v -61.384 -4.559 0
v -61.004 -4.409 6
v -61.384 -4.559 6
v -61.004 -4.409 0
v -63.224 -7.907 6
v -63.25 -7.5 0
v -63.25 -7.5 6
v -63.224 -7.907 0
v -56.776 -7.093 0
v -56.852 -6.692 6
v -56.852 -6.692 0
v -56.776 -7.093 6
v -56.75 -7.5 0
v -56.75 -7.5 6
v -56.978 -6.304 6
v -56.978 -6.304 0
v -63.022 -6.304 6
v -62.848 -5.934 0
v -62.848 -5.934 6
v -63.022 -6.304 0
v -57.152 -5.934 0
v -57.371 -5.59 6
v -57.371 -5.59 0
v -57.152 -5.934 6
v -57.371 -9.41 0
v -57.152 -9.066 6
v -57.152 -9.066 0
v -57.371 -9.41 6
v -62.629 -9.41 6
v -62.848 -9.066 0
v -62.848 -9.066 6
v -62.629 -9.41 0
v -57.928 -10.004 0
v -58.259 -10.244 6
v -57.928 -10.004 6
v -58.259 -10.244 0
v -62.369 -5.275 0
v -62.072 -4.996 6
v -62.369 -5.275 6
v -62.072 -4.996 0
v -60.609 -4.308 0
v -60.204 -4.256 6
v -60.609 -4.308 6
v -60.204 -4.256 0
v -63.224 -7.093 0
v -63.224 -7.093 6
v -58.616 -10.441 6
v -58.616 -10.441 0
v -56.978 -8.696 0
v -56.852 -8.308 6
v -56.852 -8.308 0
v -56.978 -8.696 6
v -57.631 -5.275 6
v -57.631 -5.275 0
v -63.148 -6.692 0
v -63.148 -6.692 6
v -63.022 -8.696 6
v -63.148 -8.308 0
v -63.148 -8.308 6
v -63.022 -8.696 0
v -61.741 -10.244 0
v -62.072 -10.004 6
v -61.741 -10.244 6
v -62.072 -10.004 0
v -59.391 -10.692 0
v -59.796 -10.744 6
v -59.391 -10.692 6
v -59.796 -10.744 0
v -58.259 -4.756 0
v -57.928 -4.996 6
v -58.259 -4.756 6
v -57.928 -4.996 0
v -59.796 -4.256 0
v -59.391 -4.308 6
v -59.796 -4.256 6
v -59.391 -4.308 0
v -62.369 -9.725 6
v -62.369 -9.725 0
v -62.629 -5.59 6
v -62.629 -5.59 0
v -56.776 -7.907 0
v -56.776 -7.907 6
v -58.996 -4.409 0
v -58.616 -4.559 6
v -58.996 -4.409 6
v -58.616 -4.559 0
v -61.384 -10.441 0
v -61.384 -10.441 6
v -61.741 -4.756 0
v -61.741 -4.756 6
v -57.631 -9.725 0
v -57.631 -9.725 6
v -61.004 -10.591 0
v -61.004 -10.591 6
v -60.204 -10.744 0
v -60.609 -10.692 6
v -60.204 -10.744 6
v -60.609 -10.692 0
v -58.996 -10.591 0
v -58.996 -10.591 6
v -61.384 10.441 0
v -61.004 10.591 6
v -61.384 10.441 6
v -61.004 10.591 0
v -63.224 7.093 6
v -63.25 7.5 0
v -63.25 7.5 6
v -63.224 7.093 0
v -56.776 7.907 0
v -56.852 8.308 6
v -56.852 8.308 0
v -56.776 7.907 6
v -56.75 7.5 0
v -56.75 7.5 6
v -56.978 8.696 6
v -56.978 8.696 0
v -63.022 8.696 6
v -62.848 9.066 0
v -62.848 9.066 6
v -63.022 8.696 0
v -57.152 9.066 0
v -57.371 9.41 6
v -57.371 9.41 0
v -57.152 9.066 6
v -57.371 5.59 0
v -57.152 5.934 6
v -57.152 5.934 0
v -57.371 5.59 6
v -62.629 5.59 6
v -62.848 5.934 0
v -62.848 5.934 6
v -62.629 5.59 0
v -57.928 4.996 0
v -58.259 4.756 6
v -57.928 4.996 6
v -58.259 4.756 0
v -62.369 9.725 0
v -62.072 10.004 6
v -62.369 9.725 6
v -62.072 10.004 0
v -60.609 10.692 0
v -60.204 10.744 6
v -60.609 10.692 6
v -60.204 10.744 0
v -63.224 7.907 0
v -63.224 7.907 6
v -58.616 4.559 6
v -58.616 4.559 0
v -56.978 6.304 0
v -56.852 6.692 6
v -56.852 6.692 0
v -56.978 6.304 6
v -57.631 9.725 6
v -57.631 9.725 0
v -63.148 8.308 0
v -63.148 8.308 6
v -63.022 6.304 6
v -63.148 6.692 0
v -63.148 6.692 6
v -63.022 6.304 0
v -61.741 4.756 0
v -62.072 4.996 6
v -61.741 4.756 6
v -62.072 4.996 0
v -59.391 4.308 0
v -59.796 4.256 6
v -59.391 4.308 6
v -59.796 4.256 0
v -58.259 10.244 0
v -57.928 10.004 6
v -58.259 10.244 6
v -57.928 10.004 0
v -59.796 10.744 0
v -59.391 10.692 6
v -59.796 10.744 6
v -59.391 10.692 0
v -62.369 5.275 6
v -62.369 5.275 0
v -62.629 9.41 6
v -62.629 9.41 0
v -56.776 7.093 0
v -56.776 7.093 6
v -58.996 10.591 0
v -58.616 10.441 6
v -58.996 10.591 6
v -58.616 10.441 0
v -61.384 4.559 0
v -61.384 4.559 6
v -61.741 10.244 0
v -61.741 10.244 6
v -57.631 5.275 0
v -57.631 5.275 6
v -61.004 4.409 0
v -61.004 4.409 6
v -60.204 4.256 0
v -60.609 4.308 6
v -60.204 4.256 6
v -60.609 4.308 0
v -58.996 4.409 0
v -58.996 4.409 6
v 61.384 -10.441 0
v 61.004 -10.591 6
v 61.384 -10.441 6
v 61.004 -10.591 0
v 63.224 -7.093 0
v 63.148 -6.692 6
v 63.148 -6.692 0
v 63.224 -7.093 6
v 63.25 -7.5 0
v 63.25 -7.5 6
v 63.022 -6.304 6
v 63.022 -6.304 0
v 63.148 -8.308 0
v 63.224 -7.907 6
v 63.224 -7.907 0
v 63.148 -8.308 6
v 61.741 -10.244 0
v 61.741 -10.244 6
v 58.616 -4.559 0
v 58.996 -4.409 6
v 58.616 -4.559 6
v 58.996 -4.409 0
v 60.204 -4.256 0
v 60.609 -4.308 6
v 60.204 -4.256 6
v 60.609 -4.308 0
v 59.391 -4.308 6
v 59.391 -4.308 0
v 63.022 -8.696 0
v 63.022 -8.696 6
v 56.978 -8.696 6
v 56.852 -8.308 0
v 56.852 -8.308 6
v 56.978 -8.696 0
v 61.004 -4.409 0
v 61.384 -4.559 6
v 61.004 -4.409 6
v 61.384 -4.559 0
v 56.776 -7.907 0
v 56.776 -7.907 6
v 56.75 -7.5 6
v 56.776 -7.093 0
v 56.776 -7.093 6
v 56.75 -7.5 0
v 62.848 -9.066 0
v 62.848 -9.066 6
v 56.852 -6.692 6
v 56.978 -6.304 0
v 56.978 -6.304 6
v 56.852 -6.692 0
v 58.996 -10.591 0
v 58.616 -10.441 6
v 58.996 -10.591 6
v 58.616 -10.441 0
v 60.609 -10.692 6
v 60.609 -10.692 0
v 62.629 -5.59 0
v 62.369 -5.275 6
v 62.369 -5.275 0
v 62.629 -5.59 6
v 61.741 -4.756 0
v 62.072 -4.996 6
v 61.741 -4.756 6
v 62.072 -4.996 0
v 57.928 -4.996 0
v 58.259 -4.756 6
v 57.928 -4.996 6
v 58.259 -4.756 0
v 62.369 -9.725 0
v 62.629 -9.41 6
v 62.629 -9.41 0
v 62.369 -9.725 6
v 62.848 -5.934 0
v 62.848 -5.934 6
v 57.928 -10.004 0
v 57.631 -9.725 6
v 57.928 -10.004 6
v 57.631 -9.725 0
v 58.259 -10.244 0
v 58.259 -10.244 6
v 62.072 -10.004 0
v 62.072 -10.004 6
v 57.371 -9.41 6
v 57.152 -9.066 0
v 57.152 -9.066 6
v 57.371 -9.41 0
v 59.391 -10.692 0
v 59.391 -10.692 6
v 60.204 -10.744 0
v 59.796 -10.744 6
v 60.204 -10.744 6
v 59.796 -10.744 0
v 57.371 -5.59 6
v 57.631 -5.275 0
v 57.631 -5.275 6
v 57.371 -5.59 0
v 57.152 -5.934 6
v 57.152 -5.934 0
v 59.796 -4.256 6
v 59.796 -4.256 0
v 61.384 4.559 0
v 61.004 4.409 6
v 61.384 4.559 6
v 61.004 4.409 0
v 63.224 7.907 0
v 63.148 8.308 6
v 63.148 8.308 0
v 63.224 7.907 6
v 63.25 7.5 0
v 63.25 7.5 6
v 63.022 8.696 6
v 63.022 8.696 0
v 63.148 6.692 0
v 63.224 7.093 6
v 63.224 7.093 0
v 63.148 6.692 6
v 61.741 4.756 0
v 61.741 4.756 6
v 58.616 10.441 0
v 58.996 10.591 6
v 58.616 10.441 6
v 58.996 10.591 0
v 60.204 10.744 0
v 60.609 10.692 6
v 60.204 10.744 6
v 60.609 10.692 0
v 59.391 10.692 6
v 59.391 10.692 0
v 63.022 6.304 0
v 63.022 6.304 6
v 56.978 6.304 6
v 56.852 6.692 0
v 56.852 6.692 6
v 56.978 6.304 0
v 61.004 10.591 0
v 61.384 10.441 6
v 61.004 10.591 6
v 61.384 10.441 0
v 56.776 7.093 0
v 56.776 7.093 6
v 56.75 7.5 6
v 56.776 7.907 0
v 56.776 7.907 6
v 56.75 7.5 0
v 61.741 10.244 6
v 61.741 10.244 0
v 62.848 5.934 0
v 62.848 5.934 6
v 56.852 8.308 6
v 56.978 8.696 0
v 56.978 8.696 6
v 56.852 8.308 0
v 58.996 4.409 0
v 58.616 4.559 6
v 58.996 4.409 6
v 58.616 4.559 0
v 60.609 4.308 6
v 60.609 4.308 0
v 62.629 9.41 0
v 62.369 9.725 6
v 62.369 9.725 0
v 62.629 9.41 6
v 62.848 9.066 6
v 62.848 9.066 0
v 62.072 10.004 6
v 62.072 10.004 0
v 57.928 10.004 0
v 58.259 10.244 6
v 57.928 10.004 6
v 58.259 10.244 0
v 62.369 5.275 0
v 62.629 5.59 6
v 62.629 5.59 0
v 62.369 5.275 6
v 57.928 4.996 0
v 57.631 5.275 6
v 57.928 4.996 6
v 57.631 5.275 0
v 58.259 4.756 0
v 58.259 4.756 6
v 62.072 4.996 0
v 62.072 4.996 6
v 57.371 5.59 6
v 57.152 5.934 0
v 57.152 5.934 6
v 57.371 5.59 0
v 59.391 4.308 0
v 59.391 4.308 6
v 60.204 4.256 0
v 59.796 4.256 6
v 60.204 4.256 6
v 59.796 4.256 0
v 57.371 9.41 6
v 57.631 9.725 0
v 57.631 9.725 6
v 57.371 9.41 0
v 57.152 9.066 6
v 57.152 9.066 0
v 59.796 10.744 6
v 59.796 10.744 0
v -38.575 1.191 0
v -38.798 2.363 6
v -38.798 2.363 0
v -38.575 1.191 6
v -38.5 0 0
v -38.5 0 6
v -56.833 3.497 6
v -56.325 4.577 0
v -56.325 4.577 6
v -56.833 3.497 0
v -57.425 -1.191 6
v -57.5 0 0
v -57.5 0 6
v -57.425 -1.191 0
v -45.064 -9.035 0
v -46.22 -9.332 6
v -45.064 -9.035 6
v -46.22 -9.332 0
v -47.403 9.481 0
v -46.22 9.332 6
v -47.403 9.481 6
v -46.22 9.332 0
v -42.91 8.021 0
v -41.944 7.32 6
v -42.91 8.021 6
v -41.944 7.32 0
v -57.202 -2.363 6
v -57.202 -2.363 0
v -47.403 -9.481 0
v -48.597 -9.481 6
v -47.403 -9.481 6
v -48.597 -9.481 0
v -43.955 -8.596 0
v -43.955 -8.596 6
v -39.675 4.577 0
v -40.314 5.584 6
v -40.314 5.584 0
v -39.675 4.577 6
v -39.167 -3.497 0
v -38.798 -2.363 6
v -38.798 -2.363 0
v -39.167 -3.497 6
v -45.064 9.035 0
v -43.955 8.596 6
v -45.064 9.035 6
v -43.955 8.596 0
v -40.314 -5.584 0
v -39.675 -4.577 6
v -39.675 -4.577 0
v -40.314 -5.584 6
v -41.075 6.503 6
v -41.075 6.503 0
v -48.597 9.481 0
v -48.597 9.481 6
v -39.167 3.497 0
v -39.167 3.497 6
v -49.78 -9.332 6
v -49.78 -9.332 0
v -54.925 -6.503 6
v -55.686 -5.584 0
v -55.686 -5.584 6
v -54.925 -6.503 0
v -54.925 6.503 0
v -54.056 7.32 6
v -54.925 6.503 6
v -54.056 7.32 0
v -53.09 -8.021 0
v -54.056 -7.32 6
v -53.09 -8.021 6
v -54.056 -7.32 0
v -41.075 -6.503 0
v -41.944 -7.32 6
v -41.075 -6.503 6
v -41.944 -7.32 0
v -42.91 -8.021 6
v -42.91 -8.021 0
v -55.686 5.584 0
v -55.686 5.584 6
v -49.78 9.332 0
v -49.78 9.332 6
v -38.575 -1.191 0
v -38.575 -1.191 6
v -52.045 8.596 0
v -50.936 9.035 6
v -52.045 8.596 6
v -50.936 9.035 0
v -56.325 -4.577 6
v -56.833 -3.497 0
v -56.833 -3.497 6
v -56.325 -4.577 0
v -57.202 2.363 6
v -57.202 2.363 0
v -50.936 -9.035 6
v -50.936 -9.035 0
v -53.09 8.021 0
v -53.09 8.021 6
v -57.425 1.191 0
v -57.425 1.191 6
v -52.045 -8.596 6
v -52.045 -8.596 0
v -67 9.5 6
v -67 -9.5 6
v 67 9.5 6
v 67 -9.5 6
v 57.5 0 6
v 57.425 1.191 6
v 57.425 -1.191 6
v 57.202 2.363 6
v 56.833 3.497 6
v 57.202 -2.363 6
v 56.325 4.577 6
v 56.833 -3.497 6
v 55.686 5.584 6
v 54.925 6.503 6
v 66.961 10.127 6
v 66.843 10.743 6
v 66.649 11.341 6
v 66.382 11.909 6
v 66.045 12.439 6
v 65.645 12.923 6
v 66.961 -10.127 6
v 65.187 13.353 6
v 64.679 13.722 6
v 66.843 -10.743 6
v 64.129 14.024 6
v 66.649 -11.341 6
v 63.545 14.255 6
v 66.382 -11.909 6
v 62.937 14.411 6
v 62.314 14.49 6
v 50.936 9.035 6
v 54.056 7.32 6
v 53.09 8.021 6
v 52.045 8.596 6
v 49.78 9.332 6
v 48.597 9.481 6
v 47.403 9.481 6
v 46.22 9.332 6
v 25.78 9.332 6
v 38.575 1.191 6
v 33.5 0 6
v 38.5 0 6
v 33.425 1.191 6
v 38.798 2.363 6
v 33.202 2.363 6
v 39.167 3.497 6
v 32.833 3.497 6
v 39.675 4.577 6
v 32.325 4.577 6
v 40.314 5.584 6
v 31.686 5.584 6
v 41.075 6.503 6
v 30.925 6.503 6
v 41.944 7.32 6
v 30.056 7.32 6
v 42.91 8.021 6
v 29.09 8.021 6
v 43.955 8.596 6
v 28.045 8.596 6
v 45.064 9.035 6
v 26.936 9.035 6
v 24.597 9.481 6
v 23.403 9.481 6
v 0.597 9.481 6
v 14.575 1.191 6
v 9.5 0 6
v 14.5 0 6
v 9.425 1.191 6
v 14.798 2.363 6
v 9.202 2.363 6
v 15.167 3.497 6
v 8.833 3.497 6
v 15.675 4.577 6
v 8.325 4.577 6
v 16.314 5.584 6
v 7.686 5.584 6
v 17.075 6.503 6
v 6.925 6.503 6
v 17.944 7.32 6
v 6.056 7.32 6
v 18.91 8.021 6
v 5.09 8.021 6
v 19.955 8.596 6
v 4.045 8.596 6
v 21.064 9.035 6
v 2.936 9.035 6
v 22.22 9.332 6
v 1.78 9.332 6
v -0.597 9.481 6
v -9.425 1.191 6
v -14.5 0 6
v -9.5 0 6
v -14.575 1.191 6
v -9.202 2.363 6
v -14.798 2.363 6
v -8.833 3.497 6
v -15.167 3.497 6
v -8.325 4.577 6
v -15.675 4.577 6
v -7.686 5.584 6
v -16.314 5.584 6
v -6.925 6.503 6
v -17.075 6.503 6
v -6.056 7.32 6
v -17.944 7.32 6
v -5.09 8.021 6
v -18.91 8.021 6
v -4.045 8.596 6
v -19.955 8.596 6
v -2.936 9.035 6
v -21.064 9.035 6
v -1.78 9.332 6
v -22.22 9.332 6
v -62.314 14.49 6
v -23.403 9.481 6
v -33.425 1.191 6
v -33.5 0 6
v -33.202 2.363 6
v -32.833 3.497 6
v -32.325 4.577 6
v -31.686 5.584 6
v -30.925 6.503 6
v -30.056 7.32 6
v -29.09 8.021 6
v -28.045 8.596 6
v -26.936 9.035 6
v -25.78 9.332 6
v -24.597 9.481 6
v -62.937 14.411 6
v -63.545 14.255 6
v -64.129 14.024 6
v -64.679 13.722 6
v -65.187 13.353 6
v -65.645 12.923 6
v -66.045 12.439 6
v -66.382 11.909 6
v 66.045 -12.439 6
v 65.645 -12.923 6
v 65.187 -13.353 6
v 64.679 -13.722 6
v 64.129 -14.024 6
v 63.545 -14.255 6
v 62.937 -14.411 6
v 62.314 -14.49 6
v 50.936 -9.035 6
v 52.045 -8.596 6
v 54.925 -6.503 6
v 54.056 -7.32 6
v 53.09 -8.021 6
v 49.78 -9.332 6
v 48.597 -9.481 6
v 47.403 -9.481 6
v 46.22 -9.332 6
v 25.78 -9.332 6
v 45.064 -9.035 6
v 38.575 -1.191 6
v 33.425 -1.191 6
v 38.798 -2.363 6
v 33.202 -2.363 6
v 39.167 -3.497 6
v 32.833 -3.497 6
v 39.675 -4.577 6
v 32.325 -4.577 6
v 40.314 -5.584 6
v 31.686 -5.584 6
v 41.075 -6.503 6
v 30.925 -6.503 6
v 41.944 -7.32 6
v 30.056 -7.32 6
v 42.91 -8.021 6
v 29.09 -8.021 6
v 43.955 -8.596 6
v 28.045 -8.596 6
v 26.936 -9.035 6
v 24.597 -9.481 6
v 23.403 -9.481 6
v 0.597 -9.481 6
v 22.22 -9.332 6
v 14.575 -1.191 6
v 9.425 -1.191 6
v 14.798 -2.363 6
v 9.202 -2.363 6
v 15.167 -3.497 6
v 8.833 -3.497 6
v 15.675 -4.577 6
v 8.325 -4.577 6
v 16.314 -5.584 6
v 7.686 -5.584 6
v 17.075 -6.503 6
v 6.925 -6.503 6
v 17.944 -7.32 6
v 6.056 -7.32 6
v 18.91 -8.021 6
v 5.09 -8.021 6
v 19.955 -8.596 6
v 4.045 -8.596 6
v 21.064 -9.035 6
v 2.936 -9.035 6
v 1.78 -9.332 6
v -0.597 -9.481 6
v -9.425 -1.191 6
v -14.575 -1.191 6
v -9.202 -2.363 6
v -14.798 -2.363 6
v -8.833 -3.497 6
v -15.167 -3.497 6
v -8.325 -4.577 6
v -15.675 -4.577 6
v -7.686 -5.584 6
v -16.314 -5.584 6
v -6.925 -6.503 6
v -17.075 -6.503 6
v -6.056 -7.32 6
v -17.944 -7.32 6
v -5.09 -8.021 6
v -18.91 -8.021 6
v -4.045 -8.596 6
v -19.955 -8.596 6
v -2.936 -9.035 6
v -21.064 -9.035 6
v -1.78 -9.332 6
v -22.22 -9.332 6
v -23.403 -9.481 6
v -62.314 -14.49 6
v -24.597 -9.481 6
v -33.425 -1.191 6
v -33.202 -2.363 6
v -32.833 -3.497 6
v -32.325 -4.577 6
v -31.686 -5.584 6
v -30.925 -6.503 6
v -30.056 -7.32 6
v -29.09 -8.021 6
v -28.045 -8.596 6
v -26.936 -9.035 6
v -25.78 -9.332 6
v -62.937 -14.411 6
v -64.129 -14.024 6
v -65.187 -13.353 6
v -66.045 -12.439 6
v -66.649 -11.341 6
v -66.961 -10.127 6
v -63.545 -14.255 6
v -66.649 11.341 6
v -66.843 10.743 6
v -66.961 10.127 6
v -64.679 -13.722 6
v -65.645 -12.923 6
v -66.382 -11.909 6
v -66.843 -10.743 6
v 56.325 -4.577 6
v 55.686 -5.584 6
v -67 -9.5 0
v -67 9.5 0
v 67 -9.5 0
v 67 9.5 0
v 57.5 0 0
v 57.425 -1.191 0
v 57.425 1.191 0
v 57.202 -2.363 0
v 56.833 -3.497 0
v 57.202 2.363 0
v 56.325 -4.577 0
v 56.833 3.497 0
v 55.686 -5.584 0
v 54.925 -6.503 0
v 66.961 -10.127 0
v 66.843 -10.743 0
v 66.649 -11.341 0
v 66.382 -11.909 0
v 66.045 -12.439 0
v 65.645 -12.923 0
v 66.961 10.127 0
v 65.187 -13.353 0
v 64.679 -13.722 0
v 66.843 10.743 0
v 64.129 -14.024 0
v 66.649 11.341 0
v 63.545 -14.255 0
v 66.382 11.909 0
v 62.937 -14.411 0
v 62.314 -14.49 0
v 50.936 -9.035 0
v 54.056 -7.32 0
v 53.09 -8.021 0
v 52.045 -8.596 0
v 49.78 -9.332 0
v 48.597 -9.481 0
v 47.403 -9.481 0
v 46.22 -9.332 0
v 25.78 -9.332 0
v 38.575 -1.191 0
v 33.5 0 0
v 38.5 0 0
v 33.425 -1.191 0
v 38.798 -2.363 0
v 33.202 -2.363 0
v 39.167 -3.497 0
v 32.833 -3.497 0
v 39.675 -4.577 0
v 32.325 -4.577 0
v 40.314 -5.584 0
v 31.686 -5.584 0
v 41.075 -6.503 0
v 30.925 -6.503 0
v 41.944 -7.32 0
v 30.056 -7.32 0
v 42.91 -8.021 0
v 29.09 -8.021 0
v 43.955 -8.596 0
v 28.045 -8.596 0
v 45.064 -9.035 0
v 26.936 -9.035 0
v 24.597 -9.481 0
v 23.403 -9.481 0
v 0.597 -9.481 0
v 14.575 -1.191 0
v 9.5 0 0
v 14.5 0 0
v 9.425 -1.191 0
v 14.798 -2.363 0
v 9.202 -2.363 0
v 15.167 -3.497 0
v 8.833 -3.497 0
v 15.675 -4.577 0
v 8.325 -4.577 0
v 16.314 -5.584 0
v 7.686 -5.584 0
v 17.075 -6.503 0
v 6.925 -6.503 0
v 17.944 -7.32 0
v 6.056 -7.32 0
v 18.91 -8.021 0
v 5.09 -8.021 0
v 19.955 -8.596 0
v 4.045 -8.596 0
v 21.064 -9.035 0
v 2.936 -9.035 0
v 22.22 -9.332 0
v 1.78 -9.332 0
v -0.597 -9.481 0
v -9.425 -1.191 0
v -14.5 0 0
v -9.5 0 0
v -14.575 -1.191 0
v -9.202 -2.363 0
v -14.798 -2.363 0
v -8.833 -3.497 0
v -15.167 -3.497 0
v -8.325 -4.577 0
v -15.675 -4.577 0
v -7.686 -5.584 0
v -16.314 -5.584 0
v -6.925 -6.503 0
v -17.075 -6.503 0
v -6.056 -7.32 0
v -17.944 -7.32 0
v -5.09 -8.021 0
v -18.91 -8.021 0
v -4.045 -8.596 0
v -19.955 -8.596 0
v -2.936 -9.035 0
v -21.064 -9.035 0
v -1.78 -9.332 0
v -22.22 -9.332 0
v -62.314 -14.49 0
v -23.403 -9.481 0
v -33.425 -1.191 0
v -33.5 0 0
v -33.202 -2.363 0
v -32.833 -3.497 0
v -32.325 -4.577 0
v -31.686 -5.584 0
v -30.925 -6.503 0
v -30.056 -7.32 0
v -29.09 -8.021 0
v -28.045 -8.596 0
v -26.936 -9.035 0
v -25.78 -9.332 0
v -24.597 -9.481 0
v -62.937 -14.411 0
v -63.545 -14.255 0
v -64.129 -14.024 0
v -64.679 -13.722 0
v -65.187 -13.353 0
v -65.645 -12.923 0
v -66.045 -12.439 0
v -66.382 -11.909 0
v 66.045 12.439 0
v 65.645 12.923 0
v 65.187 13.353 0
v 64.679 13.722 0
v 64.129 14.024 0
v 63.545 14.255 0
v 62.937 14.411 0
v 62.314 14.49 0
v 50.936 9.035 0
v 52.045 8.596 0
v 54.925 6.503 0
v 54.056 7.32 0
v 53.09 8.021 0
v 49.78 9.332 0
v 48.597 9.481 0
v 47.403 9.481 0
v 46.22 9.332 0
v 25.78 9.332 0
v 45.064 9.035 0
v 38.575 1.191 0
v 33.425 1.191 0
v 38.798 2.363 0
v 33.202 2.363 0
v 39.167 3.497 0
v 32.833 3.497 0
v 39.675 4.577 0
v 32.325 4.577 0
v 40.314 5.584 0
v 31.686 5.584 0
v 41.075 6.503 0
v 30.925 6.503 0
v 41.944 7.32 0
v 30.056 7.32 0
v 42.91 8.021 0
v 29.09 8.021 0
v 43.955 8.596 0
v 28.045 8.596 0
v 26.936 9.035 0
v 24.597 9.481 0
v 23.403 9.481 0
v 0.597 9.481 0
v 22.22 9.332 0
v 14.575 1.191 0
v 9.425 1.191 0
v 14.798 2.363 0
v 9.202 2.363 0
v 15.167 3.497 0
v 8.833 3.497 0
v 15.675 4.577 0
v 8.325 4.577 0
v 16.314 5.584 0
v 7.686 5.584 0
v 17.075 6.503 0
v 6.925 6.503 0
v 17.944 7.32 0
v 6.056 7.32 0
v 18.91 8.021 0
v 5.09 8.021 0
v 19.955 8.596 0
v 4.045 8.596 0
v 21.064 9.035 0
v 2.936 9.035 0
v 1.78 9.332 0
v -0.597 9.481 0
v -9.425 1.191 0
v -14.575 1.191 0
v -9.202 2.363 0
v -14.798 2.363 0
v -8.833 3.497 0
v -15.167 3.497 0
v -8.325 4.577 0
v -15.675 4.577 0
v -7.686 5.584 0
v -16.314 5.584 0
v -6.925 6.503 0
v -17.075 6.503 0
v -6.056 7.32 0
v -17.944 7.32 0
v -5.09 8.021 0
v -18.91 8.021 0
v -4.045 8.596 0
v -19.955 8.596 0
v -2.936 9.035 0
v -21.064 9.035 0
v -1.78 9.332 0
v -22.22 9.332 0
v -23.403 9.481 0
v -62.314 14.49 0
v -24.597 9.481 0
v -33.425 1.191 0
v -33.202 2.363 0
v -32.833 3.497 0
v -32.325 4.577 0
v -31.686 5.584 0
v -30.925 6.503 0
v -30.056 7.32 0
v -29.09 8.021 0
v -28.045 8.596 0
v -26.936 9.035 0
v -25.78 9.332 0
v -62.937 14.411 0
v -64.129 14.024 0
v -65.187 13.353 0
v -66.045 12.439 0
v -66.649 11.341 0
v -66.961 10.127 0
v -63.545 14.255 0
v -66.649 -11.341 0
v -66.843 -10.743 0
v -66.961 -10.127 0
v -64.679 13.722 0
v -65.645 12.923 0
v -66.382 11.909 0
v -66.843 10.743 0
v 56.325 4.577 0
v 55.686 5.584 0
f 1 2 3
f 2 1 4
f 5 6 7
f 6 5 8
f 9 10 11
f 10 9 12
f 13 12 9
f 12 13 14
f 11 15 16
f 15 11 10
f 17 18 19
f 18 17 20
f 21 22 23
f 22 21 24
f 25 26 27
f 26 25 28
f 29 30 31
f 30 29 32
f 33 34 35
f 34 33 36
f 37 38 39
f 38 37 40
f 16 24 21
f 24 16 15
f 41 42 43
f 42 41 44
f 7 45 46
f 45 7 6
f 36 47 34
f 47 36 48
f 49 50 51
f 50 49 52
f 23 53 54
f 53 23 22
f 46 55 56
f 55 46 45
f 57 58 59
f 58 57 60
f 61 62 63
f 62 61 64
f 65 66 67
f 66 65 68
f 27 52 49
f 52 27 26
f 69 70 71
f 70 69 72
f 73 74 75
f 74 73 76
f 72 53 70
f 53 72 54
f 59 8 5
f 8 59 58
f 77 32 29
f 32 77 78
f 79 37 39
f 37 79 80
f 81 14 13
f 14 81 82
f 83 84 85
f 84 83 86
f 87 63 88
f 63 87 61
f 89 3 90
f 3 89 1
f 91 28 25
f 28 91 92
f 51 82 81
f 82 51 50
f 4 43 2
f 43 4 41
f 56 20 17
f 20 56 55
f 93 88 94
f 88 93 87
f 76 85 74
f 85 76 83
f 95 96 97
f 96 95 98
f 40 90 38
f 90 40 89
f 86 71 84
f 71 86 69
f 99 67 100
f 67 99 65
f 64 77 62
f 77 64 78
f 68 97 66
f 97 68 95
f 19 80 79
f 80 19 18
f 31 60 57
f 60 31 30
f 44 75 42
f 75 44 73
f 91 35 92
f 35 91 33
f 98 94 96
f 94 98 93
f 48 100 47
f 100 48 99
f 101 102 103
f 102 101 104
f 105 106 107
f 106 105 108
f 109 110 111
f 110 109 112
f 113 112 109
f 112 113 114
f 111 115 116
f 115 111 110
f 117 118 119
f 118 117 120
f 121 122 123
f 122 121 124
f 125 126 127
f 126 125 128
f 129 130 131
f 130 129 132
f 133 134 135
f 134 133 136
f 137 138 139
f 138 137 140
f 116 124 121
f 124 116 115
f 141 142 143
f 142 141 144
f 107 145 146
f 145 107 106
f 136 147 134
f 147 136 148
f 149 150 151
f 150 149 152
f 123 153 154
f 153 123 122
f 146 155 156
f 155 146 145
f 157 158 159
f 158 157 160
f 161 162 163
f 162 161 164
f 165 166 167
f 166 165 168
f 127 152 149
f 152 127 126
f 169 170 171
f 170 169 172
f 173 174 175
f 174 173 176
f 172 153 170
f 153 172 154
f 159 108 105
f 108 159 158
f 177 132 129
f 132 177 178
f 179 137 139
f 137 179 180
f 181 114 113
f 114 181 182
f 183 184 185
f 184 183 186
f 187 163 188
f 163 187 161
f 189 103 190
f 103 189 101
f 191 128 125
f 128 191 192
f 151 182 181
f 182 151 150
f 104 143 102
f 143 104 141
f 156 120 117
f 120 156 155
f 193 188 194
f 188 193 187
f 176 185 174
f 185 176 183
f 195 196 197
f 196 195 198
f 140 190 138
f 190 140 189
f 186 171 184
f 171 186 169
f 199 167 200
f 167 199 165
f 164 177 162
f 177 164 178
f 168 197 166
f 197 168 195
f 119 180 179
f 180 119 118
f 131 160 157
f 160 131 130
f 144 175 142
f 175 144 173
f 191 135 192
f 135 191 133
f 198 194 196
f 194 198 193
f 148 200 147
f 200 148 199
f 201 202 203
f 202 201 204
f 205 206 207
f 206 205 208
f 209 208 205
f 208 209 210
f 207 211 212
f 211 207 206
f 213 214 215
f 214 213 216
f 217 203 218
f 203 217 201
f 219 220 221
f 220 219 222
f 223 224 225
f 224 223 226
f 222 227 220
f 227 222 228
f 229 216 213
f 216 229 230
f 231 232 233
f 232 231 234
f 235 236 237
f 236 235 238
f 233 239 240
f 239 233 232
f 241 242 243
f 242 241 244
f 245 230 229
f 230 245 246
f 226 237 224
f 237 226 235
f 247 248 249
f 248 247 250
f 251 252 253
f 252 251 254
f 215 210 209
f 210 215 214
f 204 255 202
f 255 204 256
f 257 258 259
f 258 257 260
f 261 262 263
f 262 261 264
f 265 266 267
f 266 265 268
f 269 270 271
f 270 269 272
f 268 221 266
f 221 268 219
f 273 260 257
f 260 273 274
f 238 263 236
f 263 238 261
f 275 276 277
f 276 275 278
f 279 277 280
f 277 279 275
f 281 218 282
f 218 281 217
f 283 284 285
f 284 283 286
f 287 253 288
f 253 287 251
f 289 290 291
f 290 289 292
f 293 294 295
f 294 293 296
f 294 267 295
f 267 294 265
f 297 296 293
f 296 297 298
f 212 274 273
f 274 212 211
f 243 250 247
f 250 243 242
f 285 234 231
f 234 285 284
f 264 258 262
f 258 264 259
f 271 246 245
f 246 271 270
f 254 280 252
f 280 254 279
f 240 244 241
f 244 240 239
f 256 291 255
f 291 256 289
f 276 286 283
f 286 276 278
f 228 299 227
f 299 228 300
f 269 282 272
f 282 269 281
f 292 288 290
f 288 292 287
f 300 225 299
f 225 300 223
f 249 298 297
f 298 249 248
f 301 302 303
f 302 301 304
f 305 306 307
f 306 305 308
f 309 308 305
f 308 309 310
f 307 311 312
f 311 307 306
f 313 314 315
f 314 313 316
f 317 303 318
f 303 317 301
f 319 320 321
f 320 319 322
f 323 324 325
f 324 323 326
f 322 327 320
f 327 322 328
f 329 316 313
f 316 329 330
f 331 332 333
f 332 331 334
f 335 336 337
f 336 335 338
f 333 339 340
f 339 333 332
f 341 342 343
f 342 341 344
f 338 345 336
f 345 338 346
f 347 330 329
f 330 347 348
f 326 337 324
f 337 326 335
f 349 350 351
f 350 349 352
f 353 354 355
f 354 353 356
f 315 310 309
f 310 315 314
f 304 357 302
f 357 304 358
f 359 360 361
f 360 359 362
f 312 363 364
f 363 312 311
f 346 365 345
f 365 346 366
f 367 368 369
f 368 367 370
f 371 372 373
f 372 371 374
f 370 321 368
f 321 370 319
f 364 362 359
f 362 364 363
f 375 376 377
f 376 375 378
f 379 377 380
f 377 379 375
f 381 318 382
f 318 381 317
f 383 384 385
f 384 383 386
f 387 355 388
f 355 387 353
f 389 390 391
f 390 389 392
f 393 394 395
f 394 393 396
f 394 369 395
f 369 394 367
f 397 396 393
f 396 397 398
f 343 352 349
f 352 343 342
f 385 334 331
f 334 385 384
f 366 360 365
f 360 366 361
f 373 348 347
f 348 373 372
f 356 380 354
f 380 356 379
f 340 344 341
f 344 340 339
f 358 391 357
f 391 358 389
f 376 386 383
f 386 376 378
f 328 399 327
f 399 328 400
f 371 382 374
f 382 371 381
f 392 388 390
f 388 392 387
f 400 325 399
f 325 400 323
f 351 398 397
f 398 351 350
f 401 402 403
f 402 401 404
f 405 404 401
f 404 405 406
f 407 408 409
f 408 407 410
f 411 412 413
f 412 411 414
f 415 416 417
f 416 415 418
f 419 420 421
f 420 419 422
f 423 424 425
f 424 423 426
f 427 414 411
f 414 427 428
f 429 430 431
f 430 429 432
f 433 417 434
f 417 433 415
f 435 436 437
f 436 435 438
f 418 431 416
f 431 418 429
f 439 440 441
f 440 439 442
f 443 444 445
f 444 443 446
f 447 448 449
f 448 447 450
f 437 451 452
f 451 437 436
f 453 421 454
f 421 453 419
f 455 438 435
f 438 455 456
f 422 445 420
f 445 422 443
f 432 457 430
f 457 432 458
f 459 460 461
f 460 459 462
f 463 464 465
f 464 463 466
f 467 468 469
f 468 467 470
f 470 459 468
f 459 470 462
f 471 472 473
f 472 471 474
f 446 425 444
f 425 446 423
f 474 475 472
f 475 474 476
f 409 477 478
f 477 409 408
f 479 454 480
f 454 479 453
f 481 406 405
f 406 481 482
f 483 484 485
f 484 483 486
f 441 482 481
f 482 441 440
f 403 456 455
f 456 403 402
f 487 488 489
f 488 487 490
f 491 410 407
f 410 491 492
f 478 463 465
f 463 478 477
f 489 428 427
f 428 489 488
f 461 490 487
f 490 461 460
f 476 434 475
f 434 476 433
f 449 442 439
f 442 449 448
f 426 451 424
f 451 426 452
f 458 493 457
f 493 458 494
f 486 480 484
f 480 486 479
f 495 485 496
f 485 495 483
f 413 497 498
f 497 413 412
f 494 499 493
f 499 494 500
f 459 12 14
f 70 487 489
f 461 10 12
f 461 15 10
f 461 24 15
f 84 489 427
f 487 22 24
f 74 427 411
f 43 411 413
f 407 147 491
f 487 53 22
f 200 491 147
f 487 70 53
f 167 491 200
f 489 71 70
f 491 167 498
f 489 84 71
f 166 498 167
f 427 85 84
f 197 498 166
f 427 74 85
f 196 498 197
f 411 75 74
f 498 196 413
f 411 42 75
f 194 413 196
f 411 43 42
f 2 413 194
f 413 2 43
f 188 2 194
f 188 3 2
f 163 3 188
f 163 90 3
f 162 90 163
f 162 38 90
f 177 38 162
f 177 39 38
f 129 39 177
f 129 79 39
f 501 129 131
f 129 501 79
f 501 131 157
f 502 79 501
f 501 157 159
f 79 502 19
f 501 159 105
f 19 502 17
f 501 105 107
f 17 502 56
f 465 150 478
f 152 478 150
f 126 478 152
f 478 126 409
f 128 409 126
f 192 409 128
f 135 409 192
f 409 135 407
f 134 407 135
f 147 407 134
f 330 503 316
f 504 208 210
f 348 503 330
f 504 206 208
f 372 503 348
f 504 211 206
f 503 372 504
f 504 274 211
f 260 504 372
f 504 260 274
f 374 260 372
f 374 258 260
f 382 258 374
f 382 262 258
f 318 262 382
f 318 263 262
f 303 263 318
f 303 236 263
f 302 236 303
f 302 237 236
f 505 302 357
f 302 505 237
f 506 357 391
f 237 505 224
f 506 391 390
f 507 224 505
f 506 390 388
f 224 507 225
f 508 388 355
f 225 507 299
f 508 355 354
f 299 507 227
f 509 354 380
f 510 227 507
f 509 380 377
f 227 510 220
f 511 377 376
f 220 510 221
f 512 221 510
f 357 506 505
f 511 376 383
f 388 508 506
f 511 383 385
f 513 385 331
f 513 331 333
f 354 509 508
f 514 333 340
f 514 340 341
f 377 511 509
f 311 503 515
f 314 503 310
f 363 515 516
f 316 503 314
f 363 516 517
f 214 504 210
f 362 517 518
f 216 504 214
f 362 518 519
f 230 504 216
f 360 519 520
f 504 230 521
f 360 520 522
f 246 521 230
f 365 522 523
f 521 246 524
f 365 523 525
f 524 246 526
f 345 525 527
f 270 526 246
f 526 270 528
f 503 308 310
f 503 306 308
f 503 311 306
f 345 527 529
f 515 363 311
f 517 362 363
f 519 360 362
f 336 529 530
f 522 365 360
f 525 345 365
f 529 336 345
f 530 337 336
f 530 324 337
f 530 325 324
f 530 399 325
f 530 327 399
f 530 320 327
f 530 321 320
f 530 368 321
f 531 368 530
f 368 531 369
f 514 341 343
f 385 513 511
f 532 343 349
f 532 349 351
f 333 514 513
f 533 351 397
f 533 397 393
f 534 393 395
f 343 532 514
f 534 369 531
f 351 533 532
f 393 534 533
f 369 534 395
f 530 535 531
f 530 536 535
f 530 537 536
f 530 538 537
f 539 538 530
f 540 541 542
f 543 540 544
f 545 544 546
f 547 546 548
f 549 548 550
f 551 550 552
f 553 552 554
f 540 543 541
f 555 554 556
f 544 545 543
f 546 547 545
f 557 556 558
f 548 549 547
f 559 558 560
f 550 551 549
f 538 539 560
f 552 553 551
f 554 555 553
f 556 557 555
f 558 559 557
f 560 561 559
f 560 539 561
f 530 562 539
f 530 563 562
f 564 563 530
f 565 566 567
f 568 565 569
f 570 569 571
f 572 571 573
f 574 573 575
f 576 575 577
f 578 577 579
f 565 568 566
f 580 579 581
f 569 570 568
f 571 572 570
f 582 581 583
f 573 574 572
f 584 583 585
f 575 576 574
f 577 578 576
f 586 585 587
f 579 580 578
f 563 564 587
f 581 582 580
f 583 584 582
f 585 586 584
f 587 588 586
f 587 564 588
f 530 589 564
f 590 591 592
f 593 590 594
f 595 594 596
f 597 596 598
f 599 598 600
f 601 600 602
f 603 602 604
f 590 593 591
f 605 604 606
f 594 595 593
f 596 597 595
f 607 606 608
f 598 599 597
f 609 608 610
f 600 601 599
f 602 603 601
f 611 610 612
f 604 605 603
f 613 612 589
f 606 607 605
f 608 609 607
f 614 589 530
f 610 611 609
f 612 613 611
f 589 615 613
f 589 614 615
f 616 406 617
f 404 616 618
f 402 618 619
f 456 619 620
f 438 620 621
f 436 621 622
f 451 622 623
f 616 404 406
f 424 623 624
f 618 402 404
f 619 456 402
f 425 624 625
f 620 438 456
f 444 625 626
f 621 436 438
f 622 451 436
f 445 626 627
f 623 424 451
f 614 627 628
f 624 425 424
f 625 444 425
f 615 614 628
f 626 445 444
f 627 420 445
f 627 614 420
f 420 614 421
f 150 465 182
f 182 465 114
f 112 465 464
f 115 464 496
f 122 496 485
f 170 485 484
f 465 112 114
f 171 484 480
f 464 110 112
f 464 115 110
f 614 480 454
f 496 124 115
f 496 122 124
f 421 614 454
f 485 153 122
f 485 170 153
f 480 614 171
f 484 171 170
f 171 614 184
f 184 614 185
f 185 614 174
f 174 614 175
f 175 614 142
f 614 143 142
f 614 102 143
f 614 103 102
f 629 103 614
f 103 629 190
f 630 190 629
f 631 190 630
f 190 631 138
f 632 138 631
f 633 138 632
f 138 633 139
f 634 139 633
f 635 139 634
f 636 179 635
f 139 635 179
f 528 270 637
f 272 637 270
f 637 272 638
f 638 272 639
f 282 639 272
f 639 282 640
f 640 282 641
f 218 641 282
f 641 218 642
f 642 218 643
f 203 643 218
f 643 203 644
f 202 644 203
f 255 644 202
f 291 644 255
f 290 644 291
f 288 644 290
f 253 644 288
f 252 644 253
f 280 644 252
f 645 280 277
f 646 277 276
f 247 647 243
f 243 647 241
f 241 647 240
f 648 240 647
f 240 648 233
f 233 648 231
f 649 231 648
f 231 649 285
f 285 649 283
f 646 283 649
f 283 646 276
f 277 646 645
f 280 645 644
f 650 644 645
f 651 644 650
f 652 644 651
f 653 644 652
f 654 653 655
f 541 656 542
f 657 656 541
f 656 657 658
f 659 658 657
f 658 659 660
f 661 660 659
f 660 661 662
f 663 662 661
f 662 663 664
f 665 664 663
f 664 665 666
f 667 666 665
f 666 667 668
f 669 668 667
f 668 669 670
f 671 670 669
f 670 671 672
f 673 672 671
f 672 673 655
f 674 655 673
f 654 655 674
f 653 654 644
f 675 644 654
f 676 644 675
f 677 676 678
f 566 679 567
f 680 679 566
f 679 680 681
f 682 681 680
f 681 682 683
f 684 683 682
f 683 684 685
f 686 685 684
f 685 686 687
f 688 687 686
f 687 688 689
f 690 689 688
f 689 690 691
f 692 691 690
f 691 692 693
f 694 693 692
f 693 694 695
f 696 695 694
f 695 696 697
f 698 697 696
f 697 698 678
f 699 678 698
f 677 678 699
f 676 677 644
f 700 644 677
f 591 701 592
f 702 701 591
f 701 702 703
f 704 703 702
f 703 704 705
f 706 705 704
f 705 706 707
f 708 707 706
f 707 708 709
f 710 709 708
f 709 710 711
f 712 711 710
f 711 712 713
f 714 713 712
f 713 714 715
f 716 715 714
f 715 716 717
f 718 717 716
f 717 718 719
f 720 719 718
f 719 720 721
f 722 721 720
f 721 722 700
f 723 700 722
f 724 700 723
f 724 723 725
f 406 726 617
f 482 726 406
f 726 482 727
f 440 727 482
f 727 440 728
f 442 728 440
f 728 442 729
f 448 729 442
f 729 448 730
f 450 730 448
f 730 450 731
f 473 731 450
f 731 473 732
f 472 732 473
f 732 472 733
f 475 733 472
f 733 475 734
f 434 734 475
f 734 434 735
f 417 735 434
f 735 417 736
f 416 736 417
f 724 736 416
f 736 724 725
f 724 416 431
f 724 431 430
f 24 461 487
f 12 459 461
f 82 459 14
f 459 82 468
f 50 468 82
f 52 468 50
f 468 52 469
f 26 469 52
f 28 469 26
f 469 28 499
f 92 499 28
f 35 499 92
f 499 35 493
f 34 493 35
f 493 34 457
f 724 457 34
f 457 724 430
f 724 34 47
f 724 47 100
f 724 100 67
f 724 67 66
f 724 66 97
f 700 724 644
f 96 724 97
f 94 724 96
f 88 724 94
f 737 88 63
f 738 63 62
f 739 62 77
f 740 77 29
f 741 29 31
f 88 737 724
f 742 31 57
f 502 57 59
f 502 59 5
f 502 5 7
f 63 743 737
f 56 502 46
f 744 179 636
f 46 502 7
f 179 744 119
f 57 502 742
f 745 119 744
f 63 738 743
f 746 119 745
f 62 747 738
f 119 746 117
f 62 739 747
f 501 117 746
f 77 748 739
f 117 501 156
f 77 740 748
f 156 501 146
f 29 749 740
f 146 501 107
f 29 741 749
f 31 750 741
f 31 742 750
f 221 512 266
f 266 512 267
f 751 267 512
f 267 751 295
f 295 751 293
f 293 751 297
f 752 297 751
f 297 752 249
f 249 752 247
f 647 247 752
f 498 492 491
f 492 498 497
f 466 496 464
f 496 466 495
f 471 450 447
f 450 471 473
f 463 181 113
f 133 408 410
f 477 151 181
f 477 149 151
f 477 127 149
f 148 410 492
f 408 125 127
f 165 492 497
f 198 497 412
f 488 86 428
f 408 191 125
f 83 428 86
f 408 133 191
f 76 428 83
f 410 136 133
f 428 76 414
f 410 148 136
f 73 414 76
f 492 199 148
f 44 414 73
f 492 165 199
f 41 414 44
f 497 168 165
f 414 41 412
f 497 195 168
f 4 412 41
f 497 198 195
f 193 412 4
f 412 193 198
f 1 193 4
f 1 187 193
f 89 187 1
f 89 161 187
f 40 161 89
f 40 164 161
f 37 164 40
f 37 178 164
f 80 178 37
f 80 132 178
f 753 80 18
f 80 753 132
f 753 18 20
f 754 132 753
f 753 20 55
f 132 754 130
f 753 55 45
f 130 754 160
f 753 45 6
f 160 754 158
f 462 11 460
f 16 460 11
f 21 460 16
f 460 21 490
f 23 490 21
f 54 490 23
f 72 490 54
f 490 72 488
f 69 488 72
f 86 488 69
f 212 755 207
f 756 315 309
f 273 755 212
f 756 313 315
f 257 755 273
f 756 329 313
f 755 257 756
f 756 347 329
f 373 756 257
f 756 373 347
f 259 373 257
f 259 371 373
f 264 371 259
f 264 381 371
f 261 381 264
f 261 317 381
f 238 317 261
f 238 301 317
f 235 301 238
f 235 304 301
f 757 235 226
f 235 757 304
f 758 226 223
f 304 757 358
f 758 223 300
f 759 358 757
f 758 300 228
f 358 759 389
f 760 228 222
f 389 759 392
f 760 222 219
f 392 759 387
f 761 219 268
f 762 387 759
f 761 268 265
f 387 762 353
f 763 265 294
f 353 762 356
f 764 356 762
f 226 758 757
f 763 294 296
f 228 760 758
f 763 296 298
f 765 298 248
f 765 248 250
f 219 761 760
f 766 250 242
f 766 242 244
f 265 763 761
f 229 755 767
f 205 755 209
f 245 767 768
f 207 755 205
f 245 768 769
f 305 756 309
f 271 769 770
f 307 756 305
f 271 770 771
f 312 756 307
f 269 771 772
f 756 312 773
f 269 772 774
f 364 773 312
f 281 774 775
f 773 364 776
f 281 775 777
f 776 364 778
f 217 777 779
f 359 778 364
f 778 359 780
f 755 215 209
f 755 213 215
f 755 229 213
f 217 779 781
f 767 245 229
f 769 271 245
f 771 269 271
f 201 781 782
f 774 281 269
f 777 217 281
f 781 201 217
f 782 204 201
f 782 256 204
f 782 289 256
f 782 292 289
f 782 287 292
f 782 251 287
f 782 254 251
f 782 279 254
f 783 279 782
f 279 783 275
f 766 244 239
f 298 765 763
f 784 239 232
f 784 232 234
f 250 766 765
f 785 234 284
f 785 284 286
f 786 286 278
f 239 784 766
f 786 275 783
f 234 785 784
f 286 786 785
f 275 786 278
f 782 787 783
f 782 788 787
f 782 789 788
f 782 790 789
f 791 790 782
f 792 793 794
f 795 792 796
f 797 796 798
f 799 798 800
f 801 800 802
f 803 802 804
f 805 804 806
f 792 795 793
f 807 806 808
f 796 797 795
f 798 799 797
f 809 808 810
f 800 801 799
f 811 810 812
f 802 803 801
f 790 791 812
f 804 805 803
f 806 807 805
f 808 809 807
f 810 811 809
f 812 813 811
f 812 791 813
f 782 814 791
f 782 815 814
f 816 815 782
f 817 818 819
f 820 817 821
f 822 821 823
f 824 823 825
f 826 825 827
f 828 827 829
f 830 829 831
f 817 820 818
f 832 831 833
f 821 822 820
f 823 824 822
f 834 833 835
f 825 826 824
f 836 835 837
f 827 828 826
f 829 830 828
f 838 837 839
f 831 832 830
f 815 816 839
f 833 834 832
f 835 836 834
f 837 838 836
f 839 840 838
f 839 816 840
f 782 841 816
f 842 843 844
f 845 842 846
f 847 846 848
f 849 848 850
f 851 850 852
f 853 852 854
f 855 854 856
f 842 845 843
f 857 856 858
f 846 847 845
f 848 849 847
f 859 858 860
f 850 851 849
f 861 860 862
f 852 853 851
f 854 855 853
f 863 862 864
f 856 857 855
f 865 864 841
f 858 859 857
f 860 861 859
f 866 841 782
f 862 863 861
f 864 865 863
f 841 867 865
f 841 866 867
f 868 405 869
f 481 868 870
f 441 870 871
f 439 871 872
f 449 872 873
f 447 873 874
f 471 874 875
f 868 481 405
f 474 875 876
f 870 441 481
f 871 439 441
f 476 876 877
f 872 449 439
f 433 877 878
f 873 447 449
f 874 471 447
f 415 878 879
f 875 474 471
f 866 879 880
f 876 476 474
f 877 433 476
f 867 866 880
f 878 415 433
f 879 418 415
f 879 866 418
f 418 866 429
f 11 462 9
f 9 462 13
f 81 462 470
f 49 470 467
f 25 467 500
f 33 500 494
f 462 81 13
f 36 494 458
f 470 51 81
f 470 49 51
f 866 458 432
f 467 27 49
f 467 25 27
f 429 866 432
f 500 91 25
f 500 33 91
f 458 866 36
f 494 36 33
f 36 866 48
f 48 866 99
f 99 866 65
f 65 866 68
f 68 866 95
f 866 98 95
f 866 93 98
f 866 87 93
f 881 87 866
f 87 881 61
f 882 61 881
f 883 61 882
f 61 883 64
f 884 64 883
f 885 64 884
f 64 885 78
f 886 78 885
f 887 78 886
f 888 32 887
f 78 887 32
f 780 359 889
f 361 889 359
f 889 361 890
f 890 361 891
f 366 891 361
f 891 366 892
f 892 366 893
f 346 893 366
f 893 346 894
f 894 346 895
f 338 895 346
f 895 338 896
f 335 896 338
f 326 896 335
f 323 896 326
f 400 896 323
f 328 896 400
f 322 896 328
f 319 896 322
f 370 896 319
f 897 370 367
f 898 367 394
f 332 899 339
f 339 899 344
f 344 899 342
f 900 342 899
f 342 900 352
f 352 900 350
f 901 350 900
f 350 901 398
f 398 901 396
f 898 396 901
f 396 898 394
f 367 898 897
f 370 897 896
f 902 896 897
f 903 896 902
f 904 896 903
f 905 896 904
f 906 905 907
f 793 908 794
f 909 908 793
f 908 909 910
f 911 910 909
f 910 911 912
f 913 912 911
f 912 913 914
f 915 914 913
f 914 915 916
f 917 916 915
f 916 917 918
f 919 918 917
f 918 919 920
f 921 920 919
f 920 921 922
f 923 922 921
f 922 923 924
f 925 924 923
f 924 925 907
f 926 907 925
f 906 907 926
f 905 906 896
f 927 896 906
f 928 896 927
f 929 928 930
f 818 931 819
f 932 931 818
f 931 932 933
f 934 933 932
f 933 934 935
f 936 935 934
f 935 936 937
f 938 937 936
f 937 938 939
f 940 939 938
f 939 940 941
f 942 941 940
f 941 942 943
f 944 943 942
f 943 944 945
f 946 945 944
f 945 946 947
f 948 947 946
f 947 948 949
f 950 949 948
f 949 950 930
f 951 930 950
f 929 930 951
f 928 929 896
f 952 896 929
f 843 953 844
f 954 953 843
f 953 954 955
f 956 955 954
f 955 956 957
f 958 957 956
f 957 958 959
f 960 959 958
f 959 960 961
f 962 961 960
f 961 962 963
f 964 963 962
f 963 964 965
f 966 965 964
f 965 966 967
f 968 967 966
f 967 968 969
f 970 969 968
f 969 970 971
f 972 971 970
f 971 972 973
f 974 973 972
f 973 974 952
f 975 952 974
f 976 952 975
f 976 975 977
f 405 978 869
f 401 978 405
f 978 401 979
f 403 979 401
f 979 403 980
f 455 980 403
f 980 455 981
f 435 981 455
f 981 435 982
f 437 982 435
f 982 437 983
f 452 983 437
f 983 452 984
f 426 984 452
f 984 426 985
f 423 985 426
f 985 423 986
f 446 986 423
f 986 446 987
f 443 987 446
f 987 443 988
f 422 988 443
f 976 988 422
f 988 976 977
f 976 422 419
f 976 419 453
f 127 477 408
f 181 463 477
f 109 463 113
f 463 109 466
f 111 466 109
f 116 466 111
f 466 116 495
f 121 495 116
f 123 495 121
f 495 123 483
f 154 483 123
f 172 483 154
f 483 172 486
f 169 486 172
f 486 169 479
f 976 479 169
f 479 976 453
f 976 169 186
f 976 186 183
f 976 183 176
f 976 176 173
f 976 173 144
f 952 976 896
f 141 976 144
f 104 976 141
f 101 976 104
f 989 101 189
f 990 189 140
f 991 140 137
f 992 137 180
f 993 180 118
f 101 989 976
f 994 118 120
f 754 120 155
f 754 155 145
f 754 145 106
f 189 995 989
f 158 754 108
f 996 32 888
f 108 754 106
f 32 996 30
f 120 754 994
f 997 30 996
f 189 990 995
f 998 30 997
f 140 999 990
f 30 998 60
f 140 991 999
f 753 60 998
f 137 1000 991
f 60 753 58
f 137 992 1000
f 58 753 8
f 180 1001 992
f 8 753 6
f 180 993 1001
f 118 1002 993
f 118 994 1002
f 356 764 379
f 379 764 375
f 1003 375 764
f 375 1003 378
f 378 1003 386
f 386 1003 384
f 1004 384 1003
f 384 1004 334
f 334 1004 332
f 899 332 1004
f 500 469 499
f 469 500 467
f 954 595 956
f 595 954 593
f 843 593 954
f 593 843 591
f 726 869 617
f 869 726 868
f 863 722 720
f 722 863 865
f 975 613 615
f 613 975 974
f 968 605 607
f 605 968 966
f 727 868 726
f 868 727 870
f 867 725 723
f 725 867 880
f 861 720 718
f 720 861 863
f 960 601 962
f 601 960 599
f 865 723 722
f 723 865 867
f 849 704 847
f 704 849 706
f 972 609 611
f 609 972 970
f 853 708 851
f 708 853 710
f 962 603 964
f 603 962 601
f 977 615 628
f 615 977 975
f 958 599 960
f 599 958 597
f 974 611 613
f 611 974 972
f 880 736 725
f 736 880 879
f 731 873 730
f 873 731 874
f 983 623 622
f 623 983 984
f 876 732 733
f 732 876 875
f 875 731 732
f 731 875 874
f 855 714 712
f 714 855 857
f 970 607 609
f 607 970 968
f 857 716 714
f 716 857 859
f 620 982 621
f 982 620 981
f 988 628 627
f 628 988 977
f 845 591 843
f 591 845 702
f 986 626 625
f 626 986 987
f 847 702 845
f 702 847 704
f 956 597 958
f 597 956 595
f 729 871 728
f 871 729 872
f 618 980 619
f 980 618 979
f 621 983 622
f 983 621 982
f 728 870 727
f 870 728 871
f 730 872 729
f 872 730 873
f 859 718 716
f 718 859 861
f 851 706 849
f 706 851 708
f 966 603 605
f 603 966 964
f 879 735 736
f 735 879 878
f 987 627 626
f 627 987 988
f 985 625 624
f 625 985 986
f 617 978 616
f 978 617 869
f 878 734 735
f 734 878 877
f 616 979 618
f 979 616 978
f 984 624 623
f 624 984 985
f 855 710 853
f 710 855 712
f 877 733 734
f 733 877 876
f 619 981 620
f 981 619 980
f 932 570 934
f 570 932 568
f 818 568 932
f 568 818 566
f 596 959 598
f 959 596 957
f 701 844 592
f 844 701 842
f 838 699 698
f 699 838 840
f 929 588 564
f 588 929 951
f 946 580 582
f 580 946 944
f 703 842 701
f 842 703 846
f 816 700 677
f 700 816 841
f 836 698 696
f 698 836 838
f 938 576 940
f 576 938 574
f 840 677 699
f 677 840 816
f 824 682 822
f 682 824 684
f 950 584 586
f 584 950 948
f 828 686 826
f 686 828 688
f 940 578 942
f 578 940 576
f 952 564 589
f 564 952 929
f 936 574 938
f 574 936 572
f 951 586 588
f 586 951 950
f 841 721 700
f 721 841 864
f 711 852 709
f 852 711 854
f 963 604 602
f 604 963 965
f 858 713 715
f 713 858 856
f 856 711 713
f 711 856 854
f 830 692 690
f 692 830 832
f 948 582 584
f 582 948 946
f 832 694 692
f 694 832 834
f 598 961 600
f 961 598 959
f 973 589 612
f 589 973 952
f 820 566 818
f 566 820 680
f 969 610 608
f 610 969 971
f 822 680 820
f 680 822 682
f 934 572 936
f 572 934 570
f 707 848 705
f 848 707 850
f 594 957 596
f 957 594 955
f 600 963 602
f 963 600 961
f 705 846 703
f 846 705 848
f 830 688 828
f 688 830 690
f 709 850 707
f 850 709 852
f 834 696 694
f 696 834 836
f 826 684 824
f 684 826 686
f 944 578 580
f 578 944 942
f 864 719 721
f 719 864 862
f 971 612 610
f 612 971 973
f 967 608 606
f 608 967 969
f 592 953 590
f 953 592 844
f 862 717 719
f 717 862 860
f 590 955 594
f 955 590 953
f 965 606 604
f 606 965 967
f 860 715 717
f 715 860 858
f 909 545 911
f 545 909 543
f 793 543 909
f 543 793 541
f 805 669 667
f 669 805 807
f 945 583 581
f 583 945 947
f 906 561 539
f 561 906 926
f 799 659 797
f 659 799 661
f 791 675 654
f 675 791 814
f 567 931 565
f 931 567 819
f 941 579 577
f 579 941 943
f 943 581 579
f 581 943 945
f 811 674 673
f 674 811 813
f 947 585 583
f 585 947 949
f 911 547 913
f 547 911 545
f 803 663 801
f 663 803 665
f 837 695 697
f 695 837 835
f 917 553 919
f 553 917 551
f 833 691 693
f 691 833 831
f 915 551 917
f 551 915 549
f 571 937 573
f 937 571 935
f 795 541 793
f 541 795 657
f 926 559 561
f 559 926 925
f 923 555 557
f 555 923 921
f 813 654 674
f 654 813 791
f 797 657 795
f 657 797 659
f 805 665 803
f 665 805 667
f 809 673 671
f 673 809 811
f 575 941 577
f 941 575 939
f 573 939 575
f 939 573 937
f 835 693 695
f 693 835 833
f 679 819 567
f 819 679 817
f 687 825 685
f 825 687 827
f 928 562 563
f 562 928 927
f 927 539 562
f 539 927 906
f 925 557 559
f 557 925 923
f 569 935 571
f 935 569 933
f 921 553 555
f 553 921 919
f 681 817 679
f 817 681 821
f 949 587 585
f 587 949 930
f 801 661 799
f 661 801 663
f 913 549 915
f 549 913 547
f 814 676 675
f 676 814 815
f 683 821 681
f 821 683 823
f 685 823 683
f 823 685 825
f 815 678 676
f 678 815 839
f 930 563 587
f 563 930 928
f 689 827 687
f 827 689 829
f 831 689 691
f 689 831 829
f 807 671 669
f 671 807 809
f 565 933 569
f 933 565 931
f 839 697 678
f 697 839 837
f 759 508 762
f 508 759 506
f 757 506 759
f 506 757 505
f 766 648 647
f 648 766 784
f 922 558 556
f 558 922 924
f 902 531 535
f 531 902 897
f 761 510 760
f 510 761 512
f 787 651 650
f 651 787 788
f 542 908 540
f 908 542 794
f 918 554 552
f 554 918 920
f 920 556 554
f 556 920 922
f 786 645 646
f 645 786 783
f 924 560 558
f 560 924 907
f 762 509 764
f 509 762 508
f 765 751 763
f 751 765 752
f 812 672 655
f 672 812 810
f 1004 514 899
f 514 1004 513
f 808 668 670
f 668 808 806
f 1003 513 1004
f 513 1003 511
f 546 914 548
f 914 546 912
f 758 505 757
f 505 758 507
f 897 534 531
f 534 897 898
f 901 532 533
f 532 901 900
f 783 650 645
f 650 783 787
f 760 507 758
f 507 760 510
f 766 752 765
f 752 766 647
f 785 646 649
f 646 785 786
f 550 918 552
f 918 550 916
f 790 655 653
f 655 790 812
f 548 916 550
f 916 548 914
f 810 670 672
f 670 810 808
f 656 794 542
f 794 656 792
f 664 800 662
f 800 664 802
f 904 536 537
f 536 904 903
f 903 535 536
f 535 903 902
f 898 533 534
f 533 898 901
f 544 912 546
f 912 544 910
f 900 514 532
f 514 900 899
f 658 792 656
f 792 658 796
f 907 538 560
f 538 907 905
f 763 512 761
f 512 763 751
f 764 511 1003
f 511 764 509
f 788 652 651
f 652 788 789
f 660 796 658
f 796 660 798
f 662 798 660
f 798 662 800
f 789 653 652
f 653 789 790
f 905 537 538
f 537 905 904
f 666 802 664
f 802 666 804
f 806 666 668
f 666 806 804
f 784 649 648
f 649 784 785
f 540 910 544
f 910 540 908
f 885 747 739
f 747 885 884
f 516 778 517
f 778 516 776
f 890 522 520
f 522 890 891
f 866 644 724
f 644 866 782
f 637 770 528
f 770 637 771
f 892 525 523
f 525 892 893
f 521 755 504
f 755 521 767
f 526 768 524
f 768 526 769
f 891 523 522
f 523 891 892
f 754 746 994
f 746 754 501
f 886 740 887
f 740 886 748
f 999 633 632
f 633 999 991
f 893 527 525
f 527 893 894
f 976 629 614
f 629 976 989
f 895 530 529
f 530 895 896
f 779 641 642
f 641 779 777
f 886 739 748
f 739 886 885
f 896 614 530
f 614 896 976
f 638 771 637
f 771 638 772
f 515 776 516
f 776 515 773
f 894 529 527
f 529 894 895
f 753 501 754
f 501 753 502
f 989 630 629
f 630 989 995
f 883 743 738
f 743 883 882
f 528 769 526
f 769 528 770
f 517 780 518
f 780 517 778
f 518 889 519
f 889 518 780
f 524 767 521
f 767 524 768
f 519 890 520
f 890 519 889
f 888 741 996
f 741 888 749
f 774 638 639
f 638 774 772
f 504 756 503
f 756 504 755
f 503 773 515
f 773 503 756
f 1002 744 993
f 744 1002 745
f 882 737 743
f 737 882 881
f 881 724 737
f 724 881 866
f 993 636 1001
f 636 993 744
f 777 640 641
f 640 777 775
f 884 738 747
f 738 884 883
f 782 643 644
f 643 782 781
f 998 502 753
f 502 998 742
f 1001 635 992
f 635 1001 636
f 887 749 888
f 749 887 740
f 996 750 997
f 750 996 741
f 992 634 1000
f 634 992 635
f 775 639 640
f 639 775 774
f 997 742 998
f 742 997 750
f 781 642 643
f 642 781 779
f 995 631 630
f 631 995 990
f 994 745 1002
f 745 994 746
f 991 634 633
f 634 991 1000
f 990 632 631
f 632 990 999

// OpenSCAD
$fn = 50;


difference() {
	union() {
		hull() {
			translate(v = [-62.0000000000, 9.5000000000, 0]) {
				cylinder(h = 6, r = 5);
			}
			translate(v = [62.0000000000, 9.5000000000, 0]) {
				cylinder(h = 6, r = 5);
			}
			translate(v = [-62.0000000000, -9.5000000000, 0]) {
				cylinder(h = 6, r = 5);
			}
			translate(v = [62.0000000000, -9.5000000000, 0]) {
				cylinder(h = 6, r = 5);
			}
		}
	}
	union() {
		#translate(v = [-60.0000000000, -7.5000000000, -100.0000000000]) {
			cylinder(h = 200, r = 3.2500000000);
		}
		#translate(v = [-60.0000000000, 7.5000000000, -100.0000000000]) {
			cylinder(h = 200, r = 3.2500000000);
		}
		#translate(v = [60.0000000000, -7.5000000000, -100.0000000000]) {
			cylinder(h = 200, r = 3.2500000000);
		}
		#translate(v = [60.0000000000, 7.5000000000, -100.0000000000]) {
			cylinder(h = 200, r = 3.2500000000);
		}
		#translate(v = [-48.0000000000, 0, 0]) {
			cylinder(h = 6, r = 9.5000000000);
		}
		#translate(v = [-24.0000000000, 0, 0]) {
			cylinder(h = 6, r = 9.5000000000);
		}
		#cylinder(h = 6, r = 9.5000000000);
		#translate(v = [24.0000000000, 0, 0]) {
			cylinder(h = 6, r = 9.5000000000);
		}
		#translate(v = [48.0000000000, 0, 0]) {
			cylinder(h = 6, r = 9.5000000000);
		}
	}
}
